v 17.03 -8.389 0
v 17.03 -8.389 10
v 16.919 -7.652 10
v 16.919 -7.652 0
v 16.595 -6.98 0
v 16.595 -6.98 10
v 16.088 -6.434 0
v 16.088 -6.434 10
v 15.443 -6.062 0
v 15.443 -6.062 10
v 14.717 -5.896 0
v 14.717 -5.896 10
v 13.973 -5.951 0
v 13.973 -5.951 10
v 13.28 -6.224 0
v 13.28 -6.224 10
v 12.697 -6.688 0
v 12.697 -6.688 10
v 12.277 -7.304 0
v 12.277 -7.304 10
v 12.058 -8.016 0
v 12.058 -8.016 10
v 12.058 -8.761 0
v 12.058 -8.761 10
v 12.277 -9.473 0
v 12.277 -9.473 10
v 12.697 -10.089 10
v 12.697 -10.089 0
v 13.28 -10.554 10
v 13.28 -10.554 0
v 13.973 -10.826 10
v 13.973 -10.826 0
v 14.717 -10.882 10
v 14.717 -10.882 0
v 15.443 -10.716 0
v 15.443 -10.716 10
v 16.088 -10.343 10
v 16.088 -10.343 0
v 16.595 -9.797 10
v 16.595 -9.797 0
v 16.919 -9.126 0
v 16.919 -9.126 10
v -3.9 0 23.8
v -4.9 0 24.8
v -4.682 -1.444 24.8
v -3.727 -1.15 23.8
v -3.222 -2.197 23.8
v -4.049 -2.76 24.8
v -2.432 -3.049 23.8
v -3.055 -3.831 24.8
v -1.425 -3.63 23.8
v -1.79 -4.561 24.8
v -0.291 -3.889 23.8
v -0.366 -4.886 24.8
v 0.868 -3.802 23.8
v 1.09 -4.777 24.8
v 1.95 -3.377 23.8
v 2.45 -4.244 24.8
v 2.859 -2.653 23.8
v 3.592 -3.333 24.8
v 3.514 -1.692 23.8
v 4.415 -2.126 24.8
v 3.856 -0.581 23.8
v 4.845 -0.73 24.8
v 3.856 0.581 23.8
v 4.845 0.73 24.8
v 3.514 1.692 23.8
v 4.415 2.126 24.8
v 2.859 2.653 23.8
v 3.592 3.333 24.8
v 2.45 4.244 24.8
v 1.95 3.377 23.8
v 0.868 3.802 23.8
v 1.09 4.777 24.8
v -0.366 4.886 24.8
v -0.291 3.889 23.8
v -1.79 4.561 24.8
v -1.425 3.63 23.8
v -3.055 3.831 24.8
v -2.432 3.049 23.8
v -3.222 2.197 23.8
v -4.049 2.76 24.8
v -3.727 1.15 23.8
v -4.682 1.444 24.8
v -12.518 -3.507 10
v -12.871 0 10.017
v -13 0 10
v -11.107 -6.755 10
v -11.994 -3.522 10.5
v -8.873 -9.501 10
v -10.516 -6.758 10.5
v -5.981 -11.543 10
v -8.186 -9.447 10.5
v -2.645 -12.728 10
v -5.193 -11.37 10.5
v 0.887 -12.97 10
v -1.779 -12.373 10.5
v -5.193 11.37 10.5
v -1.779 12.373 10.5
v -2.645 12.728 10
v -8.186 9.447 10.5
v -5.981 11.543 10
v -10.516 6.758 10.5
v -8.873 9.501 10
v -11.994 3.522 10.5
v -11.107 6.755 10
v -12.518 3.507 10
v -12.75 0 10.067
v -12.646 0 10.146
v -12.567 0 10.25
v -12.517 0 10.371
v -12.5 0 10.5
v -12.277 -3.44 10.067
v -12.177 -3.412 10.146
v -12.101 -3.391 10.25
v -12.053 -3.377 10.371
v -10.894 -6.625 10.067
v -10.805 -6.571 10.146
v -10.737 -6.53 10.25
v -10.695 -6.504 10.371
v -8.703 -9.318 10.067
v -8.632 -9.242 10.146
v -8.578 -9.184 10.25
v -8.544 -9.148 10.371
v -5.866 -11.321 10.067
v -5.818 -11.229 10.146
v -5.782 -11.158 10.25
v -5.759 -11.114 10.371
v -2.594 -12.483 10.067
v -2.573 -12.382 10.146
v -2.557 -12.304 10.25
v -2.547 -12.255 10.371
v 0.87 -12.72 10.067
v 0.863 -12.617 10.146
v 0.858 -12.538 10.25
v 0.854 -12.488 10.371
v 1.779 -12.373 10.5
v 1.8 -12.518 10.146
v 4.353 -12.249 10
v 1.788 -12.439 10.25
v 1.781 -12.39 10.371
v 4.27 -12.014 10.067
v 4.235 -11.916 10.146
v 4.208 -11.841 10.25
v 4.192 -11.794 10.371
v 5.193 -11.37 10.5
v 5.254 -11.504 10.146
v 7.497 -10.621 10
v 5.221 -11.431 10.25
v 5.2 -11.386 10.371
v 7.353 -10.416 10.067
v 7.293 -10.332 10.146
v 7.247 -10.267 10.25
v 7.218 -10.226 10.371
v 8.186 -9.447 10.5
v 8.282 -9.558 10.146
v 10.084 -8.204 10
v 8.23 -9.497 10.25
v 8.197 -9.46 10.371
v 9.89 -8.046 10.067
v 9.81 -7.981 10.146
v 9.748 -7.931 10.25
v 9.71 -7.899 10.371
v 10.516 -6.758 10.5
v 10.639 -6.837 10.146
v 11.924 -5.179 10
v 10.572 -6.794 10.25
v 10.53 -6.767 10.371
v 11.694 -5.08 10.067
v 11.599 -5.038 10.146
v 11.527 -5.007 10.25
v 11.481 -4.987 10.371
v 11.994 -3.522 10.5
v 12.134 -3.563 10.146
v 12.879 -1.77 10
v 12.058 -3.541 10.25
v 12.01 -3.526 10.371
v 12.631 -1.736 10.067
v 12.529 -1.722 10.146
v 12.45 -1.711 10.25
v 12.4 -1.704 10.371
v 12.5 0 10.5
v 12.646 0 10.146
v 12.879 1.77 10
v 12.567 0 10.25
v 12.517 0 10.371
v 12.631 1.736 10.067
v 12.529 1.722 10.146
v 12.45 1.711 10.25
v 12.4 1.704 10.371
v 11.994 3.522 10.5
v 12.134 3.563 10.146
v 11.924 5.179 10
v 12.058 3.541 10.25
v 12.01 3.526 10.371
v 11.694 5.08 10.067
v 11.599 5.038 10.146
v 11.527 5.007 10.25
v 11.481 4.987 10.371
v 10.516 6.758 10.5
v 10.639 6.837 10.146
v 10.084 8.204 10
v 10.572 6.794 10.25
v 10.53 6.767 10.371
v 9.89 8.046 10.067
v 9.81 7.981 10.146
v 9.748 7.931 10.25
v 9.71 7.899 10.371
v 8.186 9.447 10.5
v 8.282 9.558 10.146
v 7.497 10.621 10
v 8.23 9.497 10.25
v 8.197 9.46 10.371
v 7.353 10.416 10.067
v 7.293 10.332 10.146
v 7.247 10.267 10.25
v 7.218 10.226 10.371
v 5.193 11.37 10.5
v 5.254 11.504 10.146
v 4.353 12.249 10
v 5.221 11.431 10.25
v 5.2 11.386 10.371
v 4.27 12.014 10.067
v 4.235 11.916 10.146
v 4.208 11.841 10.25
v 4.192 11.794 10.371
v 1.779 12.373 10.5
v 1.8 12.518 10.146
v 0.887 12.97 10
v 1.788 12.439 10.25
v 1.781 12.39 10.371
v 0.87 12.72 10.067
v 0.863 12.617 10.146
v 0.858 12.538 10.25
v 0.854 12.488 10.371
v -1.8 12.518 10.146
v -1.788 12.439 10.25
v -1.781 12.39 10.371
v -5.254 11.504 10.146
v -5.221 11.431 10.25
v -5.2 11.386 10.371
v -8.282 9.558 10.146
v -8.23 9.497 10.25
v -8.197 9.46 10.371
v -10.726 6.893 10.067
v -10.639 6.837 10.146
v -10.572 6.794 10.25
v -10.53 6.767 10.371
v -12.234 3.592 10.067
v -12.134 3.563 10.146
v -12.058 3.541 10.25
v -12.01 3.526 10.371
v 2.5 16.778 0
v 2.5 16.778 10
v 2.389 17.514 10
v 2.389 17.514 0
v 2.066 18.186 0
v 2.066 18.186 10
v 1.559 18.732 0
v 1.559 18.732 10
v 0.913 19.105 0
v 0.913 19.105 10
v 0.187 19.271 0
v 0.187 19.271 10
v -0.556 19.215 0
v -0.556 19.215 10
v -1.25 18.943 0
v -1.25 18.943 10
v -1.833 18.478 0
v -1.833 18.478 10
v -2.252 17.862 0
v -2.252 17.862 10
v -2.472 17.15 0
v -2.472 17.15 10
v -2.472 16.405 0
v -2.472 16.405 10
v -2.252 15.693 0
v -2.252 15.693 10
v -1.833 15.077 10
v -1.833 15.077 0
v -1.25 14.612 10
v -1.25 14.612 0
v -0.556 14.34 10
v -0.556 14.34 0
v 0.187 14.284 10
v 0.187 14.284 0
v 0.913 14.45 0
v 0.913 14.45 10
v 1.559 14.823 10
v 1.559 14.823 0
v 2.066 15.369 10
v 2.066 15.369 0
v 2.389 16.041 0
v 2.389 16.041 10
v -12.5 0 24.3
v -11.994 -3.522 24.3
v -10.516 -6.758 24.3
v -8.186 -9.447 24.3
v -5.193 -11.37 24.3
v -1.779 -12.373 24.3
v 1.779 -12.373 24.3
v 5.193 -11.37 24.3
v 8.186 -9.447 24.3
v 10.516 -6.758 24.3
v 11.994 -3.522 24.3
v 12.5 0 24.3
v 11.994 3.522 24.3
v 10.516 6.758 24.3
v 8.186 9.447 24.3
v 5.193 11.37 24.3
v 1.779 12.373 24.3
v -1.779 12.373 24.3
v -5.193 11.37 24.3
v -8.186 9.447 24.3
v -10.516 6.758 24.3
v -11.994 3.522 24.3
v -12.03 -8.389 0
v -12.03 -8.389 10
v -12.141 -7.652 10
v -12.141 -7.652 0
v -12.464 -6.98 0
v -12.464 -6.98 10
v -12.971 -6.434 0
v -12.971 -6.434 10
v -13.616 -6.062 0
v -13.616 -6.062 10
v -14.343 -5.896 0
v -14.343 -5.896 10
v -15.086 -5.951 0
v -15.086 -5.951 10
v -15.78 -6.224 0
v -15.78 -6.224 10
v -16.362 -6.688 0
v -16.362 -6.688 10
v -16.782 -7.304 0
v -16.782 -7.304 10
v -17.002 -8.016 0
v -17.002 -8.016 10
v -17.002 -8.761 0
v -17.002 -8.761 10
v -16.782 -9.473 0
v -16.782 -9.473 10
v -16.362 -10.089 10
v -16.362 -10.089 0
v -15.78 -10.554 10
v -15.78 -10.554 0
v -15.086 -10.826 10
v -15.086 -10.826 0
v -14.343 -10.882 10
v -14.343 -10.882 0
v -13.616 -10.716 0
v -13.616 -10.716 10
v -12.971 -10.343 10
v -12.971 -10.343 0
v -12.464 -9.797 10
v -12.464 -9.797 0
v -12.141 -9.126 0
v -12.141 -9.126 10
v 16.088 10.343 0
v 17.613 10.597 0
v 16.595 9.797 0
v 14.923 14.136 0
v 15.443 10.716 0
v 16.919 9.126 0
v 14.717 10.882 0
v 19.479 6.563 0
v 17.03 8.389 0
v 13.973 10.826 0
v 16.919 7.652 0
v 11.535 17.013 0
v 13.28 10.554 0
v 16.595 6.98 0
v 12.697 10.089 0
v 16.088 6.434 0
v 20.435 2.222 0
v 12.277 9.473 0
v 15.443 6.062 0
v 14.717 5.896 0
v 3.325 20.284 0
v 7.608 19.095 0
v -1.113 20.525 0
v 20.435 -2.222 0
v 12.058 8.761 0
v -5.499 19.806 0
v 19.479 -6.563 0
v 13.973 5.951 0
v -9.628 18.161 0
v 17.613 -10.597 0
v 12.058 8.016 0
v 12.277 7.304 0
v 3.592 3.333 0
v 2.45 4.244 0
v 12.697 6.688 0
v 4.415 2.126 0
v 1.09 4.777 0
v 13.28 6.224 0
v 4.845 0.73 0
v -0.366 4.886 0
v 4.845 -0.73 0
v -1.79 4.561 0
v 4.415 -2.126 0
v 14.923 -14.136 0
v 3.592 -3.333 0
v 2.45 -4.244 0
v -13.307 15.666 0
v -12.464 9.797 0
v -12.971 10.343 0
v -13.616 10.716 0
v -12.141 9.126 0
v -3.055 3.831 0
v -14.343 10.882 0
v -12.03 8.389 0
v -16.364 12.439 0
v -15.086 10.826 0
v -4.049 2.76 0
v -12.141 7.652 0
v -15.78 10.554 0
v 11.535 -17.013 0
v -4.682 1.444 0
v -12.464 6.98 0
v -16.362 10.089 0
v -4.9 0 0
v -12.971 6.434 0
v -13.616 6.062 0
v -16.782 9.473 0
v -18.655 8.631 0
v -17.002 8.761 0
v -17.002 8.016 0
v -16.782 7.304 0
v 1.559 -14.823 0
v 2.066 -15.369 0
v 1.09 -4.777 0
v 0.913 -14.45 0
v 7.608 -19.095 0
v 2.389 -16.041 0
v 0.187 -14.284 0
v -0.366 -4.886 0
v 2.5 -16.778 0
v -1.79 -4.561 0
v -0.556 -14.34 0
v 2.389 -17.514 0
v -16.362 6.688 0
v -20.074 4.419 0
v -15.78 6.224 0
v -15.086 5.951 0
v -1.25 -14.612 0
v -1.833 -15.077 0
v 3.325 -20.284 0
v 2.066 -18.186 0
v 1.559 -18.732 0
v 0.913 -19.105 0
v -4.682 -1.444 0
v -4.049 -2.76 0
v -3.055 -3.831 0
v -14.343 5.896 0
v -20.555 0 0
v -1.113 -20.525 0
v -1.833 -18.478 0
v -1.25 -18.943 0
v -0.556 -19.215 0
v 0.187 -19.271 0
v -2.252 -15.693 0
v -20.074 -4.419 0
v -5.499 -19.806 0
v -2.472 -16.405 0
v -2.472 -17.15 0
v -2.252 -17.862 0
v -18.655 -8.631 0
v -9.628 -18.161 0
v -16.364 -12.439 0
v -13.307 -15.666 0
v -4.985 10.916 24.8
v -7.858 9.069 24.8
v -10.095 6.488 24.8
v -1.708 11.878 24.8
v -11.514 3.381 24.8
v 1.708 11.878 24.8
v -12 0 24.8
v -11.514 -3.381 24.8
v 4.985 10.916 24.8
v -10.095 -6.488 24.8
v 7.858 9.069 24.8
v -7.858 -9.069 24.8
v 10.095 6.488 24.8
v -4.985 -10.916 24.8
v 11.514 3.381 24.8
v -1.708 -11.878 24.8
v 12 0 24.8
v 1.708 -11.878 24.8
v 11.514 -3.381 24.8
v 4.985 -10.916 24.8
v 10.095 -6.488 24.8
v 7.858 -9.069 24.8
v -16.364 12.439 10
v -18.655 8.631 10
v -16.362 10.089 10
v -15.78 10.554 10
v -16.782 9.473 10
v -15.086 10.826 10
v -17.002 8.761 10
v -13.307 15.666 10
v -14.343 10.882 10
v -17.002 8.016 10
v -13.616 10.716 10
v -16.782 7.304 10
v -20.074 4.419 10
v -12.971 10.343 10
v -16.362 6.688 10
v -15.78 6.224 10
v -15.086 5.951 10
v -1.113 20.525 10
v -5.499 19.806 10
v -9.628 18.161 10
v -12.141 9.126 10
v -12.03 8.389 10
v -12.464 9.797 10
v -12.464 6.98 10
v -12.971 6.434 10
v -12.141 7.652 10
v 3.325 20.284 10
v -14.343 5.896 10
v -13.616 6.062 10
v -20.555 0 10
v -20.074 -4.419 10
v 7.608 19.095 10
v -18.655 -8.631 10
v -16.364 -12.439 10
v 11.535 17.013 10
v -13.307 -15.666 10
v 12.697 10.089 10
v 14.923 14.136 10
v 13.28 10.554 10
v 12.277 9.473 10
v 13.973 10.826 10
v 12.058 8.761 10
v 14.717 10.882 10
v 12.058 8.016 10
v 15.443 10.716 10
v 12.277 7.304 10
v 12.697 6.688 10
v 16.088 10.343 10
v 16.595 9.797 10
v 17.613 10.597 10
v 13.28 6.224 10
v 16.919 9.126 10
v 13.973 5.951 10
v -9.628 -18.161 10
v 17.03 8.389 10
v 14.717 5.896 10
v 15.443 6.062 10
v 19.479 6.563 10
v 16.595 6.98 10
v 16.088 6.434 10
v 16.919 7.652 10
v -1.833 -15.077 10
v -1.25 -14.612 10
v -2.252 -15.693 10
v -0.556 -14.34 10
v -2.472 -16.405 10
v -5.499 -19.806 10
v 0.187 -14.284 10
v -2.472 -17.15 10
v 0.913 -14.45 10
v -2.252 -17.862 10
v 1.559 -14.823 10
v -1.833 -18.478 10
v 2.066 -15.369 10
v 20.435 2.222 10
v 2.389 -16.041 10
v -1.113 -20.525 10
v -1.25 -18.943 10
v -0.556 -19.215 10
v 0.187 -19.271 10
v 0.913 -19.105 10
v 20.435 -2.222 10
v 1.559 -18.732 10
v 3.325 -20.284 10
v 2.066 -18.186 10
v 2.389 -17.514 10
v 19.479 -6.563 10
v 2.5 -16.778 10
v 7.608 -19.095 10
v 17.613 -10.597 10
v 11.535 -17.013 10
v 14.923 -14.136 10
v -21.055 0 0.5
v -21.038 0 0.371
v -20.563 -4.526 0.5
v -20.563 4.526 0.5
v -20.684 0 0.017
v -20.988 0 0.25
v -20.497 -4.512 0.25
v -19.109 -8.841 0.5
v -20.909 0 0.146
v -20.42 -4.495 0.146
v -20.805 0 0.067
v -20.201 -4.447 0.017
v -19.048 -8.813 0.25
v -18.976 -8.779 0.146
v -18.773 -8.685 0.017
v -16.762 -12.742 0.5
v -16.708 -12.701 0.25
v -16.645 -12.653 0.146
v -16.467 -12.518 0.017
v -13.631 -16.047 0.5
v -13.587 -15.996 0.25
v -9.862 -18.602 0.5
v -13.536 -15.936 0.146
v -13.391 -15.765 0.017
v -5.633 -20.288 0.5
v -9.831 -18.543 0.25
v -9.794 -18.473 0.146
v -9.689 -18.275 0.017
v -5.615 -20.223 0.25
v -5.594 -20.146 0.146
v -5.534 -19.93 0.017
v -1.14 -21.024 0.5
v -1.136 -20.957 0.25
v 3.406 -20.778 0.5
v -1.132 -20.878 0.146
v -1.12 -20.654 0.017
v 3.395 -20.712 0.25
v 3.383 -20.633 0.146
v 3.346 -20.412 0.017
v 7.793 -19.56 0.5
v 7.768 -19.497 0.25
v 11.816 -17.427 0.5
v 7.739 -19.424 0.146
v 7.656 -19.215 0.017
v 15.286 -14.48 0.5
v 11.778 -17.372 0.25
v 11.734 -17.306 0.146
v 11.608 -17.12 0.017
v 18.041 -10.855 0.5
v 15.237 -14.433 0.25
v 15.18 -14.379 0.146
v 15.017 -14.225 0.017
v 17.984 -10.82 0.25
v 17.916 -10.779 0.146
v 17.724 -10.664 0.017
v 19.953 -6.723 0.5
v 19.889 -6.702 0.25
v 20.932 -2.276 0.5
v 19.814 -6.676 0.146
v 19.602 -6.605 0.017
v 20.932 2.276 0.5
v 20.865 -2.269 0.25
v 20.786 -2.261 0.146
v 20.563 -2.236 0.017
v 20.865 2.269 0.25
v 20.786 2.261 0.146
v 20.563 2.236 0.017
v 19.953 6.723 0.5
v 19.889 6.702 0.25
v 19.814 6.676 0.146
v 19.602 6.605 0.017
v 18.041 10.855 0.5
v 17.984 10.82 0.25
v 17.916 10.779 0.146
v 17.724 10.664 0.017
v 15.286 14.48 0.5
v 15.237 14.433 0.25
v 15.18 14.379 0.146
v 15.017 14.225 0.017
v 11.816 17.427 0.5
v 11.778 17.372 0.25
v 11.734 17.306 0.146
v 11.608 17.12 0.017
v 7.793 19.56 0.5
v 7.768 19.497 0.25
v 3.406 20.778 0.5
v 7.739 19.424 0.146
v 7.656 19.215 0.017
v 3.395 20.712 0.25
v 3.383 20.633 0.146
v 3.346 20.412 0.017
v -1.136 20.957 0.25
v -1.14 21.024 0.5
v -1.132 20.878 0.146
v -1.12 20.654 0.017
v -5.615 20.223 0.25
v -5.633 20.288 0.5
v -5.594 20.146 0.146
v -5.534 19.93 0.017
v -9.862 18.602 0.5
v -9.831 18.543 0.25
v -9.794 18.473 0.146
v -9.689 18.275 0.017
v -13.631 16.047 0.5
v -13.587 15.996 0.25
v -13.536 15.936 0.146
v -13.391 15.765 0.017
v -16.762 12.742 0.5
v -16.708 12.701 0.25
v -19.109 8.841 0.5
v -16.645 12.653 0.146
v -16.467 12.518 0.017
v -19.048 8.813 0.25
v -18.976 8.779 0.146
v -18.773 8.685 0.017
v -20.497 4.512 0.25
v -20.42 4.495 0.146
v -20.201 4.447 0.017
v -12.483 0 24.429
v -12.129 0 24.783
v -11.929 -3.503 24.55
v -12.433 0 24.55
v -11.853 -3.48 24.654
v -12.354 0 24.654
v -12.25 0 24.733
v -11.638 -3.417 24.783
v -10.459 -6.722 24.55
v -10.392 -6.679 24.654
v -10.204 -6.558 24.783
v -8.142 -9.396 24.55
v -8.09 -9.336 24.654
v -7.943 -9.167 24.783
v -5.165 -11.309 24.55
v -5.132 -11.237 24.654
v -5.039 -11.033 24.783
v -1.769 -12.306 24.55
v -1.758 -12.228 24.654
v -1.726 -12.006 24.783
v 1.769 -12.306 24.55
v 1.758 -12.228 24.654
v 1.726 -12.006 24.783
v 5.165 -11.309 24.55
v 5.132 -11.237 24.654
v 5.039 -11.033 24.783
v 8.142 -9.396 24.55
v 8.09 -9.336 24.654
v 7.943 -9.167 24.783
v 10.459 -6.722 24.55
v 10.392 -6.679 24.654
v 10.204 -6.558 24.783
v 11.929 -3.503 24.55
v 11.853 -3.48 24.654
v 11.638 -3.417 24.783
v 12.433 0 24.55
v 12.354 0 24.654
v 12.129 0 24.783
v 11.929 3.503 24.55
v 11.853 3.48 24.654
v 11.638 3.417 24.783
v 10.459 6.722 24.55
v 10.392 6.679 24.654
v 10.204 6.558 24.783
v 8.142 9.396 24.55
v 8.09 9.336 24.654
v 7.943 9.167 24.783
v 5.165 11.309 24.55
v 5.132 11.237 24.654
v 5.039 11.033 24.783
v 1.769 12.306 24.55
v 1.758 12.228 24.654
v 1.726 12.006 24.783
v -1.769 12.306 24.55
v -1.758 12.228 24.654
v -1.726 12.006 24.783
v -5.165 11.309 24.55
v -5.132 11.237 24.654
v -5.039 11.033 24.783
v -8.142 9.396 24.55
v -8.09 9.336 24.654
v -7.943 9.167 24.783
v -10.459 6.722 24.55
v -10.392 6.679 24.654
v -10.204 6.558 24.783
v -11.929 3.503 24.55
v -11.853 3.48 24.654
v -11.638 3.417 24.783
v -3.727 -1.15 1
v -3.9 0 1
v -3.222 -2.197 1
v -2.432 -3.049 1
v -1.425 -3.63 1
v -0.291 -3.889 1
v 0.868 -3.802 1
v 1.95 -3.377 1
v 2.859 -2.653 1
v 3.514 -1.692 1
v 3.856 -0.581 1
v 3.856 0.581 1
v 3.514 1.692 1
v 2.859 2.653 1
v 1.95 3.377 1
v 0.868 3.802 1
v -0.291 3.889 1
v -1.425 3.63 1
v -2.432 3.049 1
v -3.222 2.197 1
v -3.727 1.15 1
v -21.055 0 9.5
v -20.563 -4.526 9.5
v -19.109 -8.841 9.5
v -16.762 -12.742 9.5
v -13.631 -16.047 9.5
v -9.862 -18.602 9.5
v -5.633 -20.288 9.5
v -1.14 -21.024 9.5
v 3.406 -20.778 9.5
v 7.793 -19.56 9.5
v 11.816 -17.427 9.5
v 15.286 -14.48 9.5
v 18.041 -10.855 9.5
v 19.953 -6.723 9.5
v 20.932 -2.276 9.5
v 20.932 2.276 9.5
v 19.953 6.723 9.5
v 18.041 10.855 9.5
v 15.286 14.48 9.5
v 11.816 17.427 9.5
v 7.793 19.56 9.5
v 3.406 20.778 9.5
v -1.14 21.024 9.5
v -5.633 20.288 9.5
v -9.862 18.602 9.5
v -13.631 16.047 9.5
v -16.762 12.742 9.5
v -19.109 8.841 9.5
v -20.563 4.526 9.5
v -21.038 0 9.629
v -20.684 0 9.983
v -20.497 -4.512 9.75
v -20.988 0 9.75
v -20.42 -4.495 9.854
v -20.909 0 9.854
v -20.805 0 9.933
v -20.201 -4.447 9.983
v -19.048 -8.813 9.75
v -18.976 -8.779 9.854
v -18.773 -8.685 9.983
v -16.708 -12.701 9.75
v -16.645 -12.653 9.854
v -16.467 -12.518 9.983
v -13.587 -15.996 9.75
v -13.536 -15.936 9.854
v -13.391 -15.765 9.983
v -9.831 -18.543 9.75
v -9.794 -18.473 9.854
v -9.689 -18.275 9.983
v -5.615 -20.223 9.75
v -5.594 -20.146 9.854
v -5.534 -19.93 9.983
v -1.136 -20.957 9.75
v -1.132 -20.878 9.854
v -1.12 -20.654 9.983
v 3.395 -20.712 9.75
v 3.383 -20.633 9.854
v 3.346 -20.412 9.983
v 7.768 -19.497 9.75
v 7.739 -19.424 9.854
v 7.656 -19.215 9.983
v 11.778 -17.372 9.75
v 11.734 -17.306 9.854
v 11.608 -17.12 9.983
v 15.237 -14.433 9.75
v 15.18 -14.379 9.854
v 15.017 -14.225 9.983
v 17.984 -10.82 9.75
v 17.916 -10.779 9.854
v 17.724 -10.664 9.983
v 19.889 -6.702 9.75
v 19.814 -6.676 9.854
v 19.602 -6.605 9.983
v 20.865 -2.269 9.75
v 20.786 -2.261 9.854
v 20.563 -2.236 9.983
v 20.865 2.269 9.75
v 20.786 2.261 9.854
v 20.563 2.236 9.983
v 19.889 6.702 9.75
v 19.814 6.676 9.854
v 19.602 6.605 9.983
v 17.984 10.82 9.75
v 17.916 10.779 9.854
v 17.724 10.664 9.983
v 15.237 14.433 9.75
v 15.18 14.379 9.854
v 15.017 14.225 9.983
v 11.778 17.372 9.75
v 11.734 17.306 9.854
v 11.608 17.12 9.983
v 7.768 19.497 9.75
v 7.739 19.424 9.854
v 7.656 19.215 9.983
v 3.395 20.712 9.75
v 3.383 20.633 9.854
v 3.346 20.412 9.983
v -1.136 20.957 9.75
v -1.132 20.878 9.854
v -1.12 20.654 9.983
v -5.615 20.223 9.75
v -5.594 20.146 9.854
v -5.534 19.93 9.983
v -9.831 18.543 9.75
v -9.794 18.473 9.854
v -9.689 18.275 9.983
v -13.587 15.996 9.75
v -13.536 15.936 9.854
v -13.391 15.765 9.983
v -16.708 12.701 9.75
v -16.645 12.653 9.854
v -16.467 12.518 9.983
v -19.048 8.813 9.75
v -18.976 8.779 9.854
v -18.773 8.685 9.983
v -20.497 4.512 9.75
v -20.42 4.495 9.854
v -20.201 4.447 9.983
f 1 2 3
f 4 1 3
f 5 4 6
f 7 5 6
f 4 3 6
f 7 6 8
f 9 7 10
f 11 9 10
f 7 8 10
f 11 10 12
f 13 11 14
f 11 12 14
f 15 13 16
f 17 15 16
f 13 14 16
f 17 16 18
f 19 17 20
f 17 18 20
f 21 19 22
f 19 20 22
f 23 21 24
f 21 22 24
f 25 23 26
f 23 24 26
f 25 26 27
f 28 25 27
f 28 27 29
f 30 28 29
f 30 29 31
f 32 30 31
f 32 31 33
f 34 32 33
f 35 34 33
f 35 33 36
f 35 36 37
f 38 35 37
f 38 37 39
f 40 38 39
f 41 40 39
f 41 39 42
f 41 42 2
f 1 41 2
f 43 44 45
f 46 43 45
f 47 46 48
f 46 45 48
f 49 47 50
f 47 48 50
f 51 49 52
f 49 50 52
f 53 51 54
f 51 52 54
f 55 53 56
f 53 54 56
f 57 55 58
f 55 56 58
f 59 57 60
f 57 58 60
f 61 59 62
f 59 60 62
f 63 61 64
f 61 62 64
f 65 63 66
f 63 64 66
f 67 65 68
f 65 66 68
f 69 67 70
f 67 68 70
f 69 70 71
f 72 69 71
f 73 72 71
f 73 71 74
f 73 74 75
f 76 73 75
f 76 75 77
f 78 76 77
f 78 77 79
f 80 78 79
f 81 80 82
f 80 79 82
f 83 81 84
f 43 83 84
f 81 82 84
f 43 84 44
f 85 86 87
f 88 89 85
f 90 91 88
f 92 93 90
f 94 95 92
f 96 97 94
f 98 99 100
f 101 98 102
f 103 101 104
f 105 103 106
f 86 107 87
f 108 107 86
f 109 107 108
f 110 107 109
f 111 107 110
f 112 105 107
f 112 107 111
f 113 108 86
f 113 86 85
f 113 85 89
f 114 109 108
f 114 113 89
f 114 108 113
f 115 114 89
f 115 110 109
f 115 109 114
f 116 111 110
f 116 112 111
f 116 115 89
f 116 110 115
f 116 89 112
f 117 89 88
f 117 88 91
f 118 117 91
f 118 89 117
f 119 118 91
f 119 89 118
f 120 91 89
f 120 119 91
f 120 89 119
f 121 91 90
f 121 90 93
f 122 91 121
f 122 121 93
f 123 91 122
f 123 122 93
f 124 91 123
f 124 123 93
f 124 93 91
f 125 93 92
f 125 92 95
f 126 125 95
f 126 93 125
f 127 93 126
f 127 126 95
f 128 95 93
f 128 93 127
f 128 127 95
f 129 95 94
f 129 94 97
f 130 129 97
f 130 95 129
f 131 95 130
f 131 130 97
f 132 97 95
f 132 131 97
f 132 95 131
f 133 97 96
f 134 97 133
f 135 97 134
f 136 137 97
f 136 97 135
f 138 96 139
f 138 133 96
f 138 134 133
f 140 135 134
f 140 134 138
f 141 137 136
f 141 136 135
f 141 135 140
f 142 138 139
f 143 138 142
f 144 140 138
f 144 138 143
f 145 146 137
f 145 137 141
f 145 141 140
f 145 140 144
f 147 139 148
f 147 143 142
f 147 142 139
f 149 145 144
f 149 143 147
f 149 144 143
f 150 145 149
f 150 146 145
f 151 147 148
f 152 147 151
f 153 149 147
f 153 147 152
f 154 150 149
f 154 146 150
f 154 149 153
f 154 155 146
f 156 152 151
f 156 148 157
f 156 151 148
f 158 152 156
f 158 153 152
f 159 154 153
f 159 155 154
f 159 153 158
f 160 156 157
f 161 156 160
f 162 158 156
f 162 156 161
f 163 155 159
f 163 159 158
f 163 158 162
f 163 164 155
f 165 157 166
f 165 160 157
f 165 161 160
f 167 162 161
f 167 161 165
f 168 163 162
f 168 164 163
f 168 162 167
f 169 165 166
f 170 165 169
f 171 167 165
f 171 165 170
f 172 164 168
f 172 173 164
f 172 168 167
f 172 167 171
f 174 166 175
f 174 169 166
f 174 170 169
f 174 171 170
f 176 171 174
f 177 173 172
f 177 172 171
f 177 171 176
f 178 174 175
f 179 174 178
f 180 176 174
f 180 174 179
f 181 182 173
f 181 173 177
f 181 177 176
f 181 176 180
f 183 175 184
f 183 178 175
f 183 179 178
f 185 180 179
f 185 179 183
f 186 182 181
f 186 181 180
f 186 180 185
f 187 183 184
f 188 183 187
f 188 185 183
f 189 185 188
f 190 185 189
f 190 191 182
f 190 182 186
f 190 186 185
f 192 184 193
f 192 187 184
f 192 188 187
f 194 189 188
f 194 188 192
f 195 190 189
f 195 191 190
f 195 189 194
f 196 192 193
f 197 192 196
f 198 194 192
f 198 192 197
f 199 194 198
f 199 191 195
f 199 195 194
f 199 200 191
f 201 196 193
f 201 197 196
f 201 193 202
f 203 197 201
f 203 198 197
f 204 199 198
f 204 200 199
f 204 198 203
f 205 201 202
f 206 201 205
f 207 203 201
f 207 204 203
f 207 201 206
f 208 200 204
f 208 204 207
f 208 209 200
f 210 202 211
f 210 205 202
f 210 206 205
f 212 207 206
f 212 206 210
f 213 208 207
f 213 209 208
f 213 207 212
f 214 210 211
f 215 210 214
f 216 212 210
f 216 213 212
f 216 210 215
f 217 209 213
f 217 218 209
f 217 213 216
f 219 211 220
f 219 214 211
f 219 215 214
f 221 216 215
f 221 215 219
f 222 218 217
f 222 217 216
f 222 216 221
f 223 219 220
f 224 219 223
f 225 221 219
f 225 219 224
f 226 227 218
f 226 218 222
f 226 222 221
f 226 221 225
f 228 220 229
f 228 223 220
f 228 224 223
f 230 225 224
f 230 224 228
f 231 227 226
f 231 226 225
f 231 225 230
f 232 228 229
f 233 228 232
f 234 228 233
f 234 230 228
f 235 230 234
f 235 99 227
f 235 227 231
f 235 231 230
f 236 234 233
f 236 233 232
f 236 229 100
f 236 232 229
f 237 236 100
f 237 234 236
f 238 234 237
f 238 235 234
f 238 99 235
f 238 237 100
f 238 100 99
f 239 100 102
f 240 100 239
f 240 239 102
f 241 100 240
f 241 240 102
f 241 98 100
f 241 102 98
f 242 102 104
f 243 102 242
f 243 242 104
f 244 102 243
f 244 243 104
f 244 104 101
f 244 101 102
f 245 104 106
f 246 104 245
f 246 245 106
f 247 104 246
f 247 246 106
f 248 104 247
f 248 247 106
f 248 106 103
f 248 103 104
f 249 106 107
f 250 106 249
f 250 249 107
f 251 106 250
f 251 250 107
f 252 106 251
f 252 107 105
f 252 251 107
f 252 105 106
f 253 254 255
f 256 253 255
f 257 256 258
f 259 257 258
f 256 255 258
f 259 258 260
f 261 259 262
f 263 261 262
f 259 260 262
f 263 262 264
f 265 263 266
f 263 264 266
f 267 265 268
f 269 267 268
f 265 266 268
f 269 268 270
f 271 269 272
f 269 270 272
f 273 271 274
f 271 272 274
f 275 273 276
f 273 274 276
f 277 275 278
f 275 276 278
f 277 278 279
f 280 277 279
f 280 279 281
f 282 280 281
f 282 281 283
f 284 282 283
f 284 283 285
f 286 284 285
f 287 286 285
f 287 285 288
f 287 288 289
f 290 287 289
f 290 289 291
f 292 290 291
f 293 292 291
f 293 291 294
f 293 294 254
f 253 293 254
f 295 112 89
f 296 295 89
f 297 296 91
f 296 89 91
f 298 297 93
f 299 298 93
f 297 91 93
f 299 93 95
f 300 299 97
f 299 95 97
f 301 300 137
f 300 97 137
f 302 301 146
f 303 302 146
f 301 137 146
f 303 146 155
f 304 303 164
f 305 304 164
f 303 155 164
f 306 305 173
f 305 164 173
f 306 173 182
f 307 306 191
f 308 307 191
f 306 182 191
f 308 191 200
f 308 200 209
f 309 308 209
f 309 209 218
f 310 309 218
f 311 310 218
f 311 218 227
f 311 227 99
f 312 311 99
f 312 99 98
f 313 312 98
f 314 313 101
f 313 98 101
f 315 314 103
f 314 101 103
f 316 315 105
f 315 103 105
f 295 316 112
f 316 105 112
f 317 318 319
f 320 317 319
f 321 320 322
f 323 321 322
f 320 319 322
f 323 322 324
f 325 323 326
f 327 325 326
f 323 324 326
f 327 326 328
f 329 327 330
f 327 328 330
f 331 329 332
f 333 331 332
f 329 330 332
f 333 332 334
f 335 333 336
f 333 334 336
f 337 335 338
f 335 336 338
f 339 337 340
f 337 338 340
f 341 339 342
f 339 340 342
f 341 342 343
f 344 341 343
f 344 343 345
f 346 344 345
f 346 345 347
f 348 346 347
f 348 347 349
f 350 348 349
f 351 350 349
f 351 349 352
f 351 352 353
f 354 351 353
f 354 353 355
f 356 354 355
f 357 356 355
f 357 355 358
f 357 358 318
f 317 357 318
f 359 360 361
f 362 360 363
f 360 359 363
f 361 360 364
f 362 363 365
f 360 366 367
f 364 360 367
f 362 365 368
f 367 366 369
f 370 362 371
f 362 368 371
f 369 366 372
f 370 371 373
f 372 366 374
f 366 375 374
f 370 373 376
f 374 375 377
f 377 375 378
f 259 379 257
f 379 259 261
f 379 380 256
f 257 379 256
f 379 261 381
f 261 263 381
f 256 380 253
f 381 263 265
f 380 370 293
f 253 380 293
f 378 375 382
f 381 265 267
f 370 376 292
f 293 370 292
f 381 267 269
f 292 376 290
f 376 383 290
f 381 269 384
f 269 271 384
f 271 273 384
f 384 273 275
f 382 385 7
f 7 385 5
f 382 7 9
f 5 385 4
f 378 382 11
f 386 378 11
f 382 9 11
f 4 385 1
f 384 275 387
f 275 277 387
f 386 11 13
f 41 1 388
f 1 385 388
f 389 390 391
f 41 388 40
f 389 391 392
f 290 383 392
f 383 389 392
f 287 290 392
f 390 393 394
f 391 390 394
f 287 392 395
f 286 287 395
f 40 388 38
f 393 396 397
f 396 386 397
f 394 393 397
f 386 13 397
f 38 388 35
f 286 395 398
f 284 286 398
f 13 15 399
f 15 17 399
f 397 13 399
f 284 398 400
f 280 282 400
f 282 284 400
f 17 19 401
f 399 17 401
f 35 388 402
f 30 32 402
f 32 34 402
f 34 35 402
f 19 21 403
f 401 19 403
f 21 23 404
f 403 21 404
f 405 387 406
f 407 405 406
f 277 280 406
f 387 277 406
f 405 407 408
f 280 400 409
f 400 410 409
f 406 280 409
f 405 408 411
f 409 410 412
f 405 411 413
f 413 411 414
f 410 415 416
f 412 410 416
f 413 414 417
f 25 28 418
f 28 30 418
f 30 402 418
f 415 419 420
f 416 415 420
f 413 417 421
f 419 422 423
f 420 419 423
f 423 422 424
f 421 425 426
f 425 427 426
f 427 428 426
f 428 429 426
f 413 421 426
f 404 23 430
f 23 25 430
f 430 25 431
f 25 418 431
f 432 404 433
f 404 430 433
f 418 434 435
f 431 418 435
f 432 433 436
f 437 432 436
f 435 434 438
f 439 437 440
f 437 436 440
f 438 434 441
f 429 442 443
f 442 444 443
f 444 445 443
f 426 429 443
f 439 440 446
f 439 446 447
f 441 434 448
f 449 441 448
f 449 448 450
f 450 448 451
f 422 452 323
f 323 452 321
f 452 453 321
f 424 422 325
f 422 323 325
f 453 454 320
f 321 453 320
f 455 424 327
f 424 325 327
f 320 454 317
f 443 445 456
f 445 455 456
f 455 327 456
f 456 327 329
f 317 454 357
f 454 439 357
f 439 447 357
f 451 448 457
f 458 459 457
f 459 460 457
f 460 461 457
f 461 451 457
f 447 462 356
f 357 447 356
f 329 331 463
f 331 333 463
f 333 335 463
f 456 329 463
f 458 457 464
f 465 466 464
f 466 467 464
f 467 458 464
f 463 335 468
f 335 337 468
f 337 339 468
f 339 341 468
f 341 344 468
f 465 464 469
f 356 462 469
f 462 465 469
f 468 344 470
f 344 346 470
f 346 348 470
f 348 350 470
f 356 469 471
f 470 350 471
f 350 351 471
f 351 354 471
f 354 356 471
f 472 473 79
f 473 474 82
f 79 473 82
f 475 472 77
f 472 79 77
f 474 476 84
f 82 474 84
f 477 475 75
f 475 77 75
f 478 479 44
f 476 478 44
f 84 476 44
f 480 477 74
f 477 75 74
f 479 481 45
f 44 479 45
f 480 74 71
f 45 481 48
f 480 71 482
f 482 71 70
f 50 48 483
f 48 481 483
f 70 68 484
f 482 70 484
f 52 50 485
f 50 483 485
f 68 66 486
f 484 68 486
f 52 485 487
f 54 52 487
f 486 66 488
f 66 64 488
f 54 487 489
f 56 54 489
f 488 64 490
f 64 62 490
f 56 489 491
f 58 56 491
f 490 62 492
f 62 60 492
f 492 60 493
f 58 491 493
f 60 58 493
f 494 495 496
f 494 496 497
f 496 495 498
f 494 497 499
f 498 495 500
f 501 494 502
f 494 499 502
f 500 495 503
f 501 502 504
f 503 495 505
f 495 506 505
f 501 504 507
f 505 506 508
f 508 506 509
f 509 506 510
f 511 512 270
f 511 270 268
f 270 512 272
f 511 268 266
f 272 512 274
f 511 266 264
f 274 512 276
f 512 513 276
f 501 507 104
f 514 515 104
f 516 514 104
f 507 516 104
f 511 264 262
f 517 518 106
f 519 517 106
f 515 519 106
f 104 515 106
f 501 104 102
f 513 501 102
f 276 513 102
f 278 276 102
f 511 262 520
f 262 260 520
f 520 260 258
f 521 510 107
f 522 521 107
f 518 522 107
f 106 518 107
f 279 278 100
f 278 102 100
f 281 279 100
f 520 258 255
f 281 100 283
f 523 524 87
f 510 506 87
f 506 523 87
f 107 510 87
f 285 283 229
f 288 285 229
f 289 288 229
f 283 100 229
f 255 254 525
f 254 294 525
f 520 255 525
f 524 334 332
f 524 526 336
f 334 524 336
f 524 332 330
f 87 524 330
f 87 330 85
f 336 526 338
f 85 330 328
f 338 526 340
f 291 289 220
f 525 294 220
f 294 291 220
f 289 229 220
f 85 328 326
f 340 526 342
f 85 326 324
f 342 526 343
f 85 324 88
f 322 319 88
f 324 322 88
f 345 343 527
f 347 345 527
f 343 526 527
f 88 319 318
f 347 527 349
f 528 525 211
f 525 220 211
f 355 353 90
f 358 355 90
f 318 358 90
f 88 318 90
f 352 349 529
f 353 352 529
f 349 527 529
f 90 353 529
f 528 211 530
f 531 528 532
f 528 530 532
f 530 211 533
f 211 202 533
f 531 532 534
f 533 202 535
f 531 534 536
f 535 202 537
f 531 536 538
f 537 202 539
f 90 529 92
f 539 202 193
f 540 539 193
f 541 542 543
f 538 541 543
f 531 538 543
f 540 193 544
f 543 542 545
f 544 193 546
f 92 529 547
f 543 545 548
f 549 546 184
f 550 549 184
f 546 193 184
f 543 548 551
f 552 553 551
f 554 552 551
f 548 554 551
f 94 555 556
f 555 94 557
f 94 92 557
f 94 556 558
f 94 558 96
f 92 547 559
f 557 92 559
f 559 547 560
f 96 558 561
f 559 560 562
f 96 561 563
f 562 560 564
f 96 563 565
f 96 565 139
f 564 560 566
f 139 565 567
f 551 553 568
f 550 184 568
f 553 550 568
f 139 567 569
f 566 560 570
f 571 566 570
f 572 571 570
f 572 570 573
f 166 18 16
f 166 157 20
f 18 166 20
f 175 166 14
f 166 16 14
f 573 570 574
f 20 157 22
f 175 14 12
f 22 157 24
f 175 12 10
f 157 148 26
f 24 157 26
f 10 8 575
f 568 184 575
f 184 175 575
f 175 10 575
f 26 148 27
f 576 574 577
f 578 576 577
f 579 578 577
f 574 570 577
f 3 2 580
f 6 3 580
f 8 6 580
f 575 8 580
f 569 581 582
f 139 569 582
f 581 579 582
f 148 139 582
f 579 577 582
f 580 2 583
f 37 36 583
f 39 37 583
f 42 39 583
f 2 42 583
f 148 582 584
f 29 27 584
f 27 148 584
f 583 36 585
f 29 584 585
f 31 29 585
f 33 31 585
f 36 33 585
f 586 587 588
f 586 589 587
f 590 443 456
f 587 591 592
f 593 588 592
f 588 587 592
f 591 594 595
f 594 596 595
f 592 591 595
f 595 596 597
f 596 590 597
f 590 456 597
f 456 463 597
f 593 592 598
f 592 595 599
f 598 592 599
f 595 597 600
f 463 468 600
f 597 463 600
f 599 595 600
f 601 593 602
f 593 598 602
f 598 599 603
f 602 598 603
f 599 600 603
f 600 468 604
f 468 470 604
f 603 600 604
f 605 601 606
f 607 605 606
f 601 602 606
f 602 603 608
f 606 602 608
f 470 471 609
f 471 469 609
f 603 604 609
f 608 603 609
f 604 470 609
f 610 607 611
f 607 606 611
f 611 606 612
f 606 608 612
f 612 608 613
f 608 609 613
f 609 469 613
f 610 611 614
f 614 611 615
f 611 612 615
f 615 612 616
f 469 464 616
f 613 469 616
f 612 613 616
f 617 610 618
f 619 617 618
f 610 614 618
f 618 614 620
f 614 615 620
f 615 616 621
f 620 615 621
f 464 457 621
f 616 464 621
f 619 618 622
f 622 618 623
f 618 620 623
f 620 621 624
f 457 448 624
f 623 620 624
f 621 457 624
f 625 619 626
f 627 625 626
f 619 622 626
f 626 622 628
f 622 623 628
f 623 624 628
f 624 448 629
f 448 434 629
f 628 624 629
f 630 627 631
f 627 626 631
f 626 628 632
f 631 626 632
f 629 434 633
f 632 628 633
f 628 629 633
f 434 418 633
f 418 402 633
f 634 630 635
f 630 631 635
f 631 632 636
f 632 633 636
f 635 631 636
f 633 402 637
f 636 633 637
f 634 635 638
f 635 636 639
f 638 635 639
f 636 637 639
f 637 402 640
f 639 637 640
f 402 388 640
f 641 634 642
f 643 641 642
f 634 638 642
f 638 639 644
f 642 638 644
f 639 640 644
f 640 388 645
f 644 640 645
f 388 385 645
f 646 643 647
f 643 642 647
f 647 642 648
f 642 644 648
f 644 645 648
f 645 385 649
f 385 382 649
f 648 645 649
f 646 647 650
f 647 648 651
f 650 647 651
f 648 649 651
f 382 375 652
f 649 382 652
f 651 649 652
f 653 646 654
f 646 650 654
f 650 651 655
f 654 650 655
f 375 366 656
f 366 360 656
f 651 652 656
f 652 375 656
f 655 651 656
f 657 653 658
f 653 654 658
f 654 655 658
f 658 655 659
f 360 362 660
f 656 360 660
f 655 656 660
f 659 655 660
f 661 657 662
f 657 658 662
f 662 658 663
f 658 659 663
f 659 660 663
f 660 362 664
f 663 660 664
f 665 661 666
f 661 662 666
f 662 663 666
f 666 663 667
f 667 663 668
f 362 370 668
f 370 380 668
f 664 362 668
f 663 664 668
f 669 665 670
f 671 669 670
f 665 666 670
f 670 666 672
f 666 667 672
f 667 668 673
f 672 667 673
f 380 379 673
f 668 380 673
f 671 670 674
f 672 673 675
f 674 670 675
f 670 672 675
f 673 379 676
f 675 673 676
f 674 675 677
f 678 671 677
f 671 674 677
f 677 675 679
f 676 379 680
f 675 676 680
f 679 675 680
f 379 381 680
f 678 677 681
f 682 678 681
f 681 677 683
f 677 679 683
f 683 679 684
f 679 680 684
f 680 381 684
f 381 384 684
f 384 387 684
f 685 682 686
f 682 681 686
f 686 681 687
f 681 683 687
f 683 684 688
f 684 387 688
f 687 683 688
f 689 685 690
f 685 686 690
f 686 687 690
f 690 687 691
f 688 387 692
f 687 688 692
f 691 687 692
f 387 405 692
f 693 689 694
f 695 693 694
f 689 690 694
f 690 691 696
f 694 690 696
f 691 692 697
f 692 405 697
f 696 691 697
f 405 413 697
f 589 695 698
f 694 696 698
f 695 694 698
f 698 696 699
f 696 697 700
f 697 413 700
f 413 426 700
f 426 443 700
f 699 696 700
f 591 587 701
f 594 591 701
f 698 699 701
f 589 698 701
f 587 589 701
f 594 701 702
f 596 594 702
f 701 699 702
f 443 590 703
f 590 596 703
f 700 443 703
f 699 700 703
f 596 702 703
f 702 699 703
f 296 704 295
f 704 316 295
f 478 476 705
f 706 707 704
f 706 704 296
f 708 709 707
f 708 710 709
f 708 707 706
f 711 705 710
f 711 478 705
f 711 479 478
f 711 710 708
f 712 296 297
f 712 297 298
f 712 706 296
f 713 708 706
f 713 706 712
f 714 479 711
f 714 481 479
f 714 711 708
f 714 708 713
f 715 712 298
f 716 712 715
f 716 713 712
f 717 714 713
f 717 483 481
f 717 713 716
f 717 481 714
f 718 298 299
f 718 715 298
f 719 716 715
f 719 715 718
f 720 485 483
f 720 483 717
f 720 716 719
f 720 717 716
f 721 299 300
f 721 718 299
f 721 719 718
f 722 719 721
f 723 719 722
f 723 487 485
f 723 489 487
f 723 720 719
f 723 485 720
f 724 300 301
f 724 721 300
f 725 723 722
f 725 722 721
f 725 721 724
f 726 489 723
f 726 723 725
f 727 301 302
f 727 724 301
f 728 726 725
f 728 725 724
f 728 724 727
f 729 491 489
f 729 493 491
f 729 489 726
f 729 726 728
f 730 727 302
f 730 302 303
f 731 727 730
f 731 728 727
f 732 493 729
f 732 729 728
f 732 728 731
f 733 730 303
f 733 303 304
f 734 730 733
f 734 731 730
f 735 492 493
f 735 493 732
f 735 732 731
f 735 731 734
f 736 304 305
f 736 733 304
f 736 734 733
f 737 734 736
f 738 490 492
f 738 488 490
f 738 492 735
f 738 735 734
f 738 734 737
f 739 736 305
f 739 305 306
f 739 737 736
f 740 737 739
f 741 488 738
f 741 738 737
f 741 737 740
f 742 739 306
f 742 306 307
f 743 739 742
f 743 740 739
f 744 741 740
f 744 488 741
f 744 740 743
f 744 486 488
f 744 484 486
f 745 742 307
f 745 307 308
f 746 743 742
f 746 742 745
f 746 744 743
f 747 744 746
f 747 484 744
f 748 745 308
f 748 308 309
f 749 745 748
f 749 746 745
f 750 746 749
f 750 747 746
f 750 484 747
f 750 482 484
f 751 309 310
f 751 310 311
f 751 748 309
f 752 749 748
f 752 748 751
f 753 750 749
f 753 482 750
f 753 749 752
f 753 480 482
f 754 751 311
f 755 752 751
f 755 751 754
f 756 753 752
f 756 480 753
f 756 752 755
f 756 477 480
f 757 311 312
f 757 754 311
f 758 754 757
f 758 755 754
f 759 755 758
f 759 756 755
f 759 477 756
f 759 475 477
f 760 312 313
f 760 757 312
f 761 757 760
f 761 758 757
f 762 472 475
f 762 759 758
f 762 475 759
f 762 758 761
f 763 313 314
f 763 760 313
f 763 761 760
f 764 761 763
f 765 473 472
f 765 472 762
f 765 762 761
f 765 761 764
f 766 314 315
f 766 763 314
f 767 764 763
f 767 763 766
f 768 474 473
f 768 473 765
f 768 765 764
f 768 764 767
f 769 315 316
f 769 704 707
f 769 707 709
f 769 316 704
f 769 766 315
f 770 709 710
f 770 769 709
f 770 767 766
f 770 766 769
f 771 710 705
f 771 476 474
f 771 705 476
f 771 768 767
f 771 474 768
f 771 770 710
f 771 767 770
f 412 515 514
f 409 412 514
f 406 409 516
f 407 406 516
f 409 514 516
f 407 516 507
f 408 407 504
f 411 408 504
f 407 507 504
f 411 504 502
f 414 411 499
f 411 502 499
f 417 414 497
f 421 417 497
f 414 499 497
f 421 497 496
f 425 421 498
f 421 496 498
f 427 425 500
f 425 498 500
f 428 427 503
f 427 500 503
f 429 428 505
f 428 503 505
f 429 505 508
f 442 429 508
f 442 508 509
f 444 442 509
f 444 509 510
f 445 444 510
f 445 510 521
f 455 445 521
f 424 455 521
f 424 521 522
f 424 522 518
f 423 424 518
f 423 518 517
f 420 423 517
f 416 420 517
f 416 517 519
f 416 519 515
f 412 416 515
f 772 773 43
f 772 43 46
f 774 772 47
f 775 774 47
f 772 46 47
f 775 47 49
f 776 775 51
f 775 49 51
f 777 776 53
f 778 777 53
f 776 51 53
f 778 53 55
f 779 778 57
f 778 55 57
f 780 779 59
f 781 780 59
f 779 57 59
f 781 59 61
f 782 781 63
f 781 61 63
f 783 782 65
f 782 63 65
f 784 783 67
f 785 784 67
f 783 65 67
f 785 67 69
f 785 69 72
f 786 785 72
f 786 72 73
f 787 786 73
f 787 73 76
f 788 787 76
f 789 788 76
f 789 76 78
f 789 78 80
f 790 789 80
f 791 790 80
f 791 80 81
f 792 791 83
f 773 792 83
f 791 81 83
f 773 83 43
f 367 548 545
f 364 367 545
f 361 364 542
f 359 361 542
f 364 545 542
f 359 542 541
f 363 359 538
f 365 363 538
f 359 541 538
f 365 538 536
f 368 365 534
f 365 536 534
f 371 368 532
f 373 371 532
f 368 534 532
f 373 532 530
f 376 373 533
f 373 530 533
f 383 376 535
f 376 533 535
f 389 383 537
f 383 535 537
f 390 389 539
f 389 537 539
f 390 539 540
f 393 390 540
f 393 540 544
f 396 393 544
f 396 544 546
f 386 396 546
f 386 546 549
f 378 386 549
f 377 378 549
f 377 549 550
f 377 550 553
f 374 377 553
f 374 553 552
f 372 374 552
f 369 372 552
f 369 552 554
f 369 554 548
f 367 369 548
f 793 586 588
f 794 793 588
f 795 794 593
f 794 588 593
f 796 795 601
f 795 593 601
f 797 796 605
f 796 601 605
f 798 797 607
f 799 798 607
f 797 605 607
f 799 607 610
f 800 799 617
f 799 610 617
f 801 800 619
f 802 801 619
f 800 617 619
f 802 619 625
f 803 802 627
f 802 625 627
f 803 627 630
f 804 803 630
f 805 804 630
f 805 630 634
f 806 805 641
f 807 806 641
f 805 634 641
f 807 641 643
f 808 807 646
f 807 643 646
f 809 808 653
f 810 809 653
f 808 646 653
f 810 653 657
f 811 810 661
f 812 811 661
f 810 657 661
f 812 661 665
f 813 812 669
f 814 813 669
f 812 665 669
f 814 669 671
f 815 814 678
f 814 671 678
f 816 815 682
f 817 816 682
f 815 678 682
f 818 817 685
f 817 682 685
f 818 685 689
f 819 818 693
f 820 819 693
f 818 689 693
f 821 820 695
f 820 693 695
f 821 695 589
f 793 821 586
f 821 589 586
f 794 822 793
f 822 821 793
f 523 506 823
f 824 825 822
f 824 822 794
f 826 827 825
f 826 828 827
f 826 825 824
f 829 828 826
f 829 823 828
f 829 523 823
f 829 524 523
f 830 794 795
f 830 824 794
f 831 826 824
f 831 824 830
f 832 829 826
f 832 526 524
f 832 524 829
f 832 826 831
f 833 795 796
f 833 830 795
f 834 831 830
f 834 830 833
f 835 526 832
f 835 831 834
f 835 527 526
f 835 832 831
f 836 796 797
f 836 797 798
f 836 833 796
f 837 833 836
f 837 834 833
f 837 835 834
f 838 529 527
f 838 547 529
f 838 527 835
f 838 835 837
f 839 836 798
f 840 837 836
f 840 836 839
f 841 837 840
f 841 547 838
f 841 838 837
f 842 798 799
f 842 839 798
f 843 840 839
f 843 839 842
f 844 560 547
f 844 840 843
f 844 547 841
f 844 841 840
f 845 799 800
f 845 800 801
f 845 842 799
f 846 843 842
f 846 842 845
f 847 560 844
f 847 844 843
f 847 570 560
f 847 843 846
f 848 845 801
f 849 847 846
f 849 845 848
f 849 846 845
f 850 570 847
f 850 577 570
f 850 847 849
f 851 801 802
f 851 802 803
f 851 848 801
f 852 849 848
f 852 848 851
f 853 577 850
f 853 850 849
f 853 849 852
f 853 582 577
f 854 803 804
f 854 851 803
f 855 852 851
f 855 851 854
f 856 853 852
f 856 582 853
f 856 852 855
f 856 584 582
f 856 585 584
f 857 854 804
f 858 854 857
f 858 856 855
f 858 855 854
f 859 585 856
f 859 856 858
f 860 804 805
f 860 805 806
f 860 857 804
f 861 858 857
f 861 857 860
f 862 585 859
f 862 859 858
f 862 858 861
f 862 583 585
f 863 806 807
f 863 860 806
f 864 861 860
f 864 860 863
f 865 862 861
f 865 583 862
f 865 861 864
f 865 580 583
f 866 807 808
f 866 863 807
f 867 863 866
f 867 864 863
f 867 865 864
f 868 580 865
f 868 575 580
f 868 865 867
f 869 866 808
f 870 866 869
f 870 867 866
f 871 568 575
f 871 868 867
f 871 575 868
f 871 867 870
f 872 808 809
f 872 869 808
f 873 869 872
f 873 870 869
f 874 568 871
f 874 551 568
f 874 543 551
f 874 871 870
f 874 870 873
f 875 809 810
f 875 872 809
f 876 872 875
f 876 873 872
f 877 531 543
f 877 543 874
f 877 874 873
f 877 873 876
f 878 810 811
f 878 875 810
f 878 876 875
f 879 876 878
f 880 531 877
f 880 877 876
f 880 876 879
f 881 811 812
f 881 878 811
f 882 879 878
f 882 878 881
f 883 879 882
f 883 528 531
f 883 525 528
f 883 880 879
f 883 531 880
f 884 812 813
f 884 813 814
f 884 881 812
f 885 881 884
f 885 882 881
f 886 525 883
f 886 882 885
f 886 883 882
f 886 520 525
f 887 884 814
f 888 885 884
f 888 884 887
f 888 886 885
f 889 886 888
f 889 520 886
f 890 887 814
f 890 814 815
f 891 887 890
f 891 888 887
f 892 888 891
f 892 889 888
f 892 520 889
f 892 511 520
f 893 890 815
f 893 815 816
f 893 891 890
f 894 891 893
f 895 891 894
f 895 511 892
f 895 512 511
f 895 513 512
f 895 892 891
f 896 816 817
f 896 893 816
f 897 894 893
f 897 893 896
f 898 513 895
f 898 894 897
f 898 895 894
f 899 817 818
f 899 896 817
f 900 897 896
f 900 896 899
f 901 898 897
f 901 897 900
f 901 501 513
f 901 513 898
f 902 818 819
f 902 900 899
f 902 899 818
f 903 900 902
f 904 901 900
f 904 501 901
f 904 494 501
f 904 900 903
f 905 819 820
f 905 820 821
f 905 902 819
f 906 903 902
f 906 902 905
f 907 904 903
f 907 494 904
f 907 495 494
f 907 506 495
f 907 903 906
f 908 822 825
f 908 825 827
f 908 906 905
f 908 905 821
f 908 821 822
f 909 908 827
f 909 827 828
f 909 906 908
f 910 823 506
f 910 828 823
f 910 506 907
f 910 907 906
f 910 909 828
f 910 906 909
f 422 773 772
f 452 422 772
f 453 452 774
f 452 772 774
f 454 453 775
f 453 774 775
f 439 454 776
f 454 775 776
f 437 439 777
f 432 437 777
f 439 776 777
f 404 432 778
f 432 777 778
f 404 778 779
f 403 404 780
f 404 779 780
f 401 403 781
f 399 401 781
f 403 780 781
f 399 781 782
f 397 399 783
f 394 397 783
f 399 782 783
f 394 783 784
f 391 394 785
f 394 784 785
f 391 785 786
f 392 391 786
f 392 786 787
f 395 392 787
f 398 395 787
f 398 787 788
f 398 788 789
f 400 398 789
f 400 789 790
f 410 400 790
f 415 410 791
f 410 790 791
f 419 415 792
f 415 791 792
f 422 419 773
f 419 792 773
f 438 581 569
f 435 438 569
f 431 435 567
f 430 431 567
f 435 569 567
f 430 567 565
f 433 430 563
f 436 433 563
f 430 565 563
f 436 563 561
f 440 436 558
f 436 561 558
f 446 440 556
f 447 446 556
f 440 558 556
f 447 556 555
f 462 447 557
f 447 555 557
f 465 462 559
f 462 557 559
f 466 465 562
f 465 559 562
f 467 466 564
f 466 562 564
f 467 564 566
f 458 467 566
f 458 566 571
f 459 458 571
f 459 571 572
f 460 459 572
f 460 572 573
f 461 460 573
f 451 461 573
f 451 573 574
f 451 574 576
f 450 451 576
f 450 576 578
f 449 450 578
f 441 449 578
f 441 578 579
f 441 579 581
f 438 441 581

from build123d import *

# Parameters (mm, degrees)
F2_R     = 2.5
F3_DEPTH = 25
F4_R     = 0.5
F5_SIZE  = 1


with BuildPart() as f1:
    # F0 (on Front) → F1 (revolve)
    with BuildSketch(Plane.XZ):
        Polygon((-21.055, 10), (-21.055, 0), (-3.9, 0), (-3.9, 24.8), (-12.5, 24.8), (-12.5, 10), align=None)
    revolve(axis=Axis((0, 0, 19.087244), (0, 0, 1)))

    # F2 (on face) → F3 (cut)
    with BuildSketch(Plane.XY.offset(10)):
        with Locations((0, 16.7775)):
            Circle(F2_R)
        with Locations((-14.529741, 8.38875)):
            Circle(F2_R)
        with Locations((-14.529741, -8.38875)):
            Circle(F2_R)
        with Locations((0, -16.7775)):
            Circle(F2_R)
        with Locations((14.529741, -8.38875)):
            Circle(F2_R)
        with Locations((14.529741, 8.38875)):
            Circle(F2_R)
    extrude(amount=-F3_DEPTH, mode=Mode.SUBTRACT)

    # F4
    f4_edges = [f1.edges().sort_by_distance(p)[0] for p in [
        (12.5, 0, 24.8),
        (21.055, 0, 10),
        (21.055, 0, 0),
        (12.5, 0, 10),
    ]]
    fillet(f4_edges, radius=F4_R)

    # F5
    f5_edges = [f1.edges().sort_by_distance(p)[0] for p in [
        (3.9, 0, 24.8),
        (3.9, 0, 0),
    ]]
    chamfer(f5_edges, length=F5_SIZE)


solid = f1.part
